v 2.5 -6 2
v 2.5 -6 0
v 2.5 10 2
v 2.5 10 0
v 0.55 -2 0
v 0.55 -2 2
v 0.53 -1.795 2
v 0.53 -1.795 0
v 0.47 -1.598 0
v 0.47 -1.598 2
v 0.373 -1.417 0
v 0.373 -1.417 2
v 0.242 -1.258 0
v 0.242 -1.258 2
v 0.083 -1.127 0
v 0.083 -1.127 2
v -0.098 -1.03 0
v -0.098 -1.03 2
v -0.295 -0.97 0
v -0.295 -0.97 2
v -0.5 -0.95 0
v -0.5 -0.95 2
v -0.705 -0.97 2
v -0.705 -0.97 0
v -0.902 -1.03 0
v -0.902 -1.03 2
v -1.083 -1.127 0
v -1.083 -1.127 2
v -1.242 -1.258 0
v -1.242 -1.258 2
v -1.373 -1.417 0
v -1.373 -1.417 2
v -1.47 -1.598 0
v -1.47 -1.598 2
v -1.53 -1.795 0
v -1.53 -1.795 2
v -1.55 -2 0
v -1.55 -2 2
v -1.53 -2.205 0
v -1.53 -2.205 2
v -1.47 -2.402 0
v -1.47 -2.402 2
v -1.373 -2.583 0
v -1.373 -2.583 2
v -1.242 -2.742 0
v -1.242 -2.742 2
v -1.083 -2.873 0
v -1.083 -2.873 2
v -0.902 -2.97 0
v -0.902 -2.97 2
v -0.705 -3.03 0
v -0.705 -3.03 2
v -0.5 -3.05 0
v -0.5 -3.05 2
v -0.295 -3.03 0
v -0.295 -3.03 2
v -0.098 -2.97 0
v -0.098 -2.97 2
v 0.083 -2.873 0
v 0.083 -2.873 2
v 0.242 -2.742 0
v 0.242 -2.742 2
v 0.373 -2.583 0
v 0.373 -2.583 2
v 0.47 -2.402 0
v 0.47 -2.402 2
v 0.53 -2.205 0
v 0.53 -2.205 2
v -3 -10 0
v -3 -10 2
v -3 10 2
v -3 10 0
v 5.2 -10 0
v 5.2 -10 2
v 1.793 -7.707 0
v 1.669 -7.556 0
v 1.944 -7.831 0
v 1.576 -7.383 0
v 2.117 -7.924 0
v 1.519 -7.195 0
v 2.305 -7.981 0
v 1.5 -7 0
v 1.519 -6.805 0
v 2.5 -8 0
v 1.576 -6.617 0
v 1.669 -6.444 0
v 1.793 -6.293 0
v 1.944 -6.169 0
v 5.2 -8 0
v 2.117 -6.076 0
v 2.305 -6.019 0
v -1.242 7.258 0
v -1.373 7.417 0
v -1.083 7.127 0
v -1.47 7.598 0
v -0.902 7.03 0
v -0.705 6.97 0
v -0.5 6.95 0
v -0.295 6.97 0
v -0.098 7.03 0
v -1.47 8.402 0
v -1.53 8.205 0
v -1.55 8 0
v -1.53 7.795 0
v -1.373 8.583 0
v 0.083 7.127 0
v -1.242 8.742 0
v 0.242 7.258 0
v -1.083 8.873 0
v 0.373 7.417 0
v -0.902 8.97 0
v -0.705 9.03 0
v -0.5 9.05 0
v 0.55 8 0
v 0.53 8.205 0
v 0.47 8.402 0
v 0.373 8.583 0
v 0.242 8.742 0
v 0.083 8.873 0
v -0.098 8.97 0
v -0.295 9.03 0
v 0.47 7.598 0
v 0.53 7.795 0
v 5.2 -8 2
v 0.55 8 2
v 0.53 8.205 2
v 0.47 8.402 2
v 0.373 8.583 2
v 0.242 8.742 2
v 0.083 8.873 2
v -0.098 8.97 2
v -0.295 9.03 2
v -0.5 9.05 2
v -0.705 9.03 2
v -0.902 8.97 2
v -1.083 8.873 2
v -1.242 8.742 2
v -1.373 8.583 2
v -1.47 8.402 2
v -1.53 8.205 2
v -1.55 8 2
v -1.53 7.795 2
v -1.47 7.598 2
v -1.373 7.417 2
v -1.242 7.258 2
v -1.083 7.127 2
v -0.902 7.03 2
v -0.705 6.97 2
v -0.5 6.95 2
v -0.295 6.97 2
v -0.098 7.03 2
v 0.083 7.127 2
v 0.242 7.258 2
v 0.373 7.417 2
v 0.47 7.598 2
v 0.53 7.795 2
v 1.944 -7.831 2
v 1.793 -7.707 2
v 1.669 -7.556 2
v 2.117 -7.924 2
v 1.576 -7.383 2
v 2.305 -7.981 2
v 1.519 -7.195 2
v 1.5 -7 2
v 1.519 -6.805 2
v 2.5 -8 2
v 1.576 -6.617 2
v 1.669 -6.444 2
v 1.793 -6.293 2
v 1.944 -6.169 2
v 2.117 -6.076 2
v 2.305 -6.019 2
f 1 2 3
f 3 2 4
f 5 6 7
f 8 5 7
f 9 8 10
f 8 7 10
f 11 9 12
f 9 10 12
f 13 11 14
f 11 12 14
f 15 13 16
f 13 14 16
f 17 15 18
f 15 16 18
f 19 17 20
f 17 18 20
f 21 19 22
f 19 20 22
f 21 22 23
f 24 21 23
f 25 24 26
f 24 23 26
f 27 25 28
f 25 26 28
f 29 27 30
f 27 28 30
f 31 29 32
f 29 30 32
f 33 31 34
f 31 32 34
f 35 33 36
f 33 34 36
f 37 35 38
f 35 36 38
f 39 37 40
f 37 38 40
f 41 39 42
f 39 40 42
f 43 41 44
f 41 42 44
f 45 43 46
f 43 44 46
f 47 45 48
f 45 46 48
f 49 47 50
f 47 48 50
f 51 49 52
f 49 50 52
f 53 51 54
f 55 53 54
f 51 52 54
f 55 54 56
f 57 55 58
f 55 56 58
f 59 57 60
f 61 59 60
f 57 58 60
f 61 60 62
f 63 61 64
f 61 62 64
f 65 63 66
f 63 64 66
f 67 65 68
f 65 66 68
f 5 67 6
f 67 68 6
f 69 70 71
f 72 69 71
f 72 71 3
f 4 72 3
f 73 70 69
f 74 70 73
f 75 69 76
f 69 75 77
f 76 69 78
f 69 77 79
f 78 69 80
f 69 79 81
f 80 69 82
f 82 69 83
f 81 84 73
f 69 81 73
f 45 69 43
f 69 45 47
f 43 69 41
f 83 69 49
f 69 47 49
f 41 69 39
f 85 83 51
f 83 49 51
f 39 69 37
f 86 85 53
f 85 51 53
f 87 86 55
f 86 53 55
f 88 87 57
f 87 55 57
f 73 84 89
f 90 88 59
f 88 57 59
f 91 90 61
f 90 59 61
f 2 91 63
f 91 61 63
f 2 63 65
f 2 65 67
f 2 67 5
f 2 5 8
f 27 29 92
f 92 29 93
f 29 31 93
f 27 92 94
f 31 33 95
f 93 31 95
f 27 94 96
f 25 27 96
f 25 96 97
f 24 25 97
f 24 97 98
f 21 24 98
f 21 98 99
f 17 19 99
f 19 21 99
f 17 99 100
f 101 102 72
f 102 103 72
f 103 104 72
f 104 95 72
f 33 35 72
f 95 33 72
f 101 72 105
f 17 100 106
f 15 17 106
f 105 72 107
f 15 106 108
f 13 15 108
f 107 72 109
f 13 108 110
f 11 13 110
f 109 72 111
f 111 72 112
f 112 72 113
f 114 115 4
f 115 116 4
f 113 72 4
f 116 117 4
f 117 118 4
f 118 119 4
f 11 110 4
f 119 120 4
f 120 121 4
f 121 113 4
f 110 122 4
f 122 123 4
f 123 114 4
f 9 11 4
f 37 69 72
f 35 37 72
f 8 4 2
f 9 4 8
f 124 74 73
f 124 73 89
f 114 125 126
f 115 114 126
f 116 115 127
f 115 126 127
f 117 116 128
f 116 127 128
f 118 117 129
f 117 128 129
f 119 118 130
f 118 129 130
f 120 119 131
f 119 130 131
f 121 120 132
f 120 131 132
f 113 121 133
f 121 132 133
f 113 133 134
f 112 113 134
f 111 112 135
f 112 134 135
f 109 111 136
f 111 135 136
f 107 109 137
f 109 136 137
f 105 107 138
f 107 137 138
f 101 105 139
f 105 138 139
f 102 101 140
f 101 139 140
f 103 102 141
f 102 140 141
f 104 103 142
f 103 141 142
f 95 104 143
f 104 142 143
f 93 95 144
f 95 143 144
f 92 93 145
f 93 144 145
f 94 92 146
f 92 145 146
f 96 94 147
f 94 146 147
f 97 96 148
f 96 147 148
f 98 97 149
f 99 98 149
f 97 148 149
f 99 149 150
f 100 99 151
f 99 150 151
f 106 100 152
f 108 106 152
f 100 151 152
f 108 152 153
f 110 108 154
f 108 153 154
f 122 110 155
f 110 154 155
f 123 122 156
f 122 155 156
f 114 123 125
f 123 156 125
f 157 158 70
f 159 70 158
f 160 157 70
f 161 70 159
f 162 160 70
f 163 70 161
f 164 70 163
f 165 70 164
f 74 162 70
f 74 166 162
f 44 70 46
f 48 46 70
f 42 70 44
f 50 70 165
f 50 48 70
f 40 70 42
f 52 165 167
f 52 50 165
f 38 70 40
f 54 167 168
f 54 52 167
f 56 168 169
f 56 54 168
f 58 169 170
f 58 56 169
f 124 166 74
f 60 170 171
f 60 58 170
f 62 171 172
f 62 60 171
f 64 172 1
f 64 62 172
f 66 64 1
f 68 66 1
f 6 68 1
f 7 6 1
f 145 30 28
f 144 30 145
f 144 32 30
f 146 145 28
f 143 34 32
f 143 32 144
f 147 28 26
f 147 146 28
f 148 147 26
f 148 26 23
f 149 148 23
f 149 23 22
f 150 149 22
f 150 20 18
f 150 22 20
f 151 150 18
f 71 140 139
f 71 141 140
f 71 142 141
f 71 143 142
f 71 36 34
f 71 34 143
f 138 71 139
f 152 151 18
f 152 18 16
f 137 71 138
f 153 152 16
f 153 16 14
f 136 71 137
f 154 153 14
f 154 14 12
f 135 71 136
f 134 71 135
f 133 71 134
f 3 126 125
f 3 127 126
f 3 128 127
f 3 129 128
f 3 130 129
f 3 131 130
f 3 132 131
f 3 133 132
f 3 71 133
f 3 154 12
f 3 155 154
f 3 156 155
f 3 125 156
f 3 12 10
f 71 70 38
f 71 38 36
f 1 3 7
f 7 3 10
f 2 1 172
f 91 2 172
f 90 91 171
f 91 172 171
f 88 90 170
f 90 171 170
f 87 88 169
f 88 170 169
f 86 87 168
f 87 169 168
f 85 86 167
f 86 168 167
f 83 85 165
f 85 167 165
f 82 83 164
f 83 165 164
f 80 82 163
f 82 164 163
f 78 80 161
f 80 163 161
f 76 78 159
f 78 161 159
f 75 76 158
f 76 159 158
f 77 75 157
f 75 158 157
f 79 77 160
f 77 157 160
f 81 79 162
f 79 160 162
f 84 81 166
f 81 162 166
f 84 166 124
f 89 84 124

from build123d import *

# Parameters (mm, degrees)
SKETCH_1_W          = 5
SKETCH_1_H          = 20
EXTRUDE_1_DEPTH     = 2
SKETCH_2_W          = 2.7
SKETCH_2_H          = 2
EXTRUDE_2_DEPTH     = 2
SKETCH_4_R          = 1.05
CUT_EXTRUDE_1_DEPTH = 2
SKETCH_5_R          = 1
CUT_EXTRUDE_2_DEPTH = 12
SKETCH_6_W          = 0.5
SKETCH_6_H          = 20
EXTRUDE_3_DEPTH     = 2


with BuildPart() as part:
    # 草图1 → 凸台-拉伸1 (new body)
    with BuildSketch(Plane.XY):
        Rectangle(SKETCH_1_W, SKETCH_1_H)
    extrude(amount=EXTRUDE_1_DEPTH)

    # 草图2 → 凸台-拉伸2 (add)
    with BuildSketch(Plane.XY.offset(2)):
        with Locations((3.85, -9)):
            Rectangle(SKETCH_2_W, SKETCH_2_H)
    extrude(amount=-EXTRUDE_2_DEPTH)

    # 草图4 → 切除-拉伸1 (cut)
    with BuildSketch(Plane.XY.offset(2)):
        with Locations((-0.5, -2)):
            Circle(SKETCH_4_R)
        with Locations((-0.5, 8)):
            Circle(SKETCH_4_R)
    extrude(amount=-CUT_EXTRUDE_1_DEPTH, mode=Mode.SUBTRACT)

    # 草图5 → 切除-拉伸2 (cut)
    with BuildSketch(Plane.XY.offset(2)):
        with Locations((2.5, -7)):
            Circle(SKETCH_5_R)
    extrude(amount=-CUT_EXTRUDE_2_DEPTH, mode=Mode.SUBTRACT)

    # 草图6 → 凸台-拉伸3 (add)
    with BuildSketch(Plane.XY.offset(2)):
        with Locations((-2.75, 0)):
            Rectangle(SKETCH_6_W, SKETCH_6_H)
    extrude(amount=-EXTRUDE_3_DEPTH)


solid = part.part
